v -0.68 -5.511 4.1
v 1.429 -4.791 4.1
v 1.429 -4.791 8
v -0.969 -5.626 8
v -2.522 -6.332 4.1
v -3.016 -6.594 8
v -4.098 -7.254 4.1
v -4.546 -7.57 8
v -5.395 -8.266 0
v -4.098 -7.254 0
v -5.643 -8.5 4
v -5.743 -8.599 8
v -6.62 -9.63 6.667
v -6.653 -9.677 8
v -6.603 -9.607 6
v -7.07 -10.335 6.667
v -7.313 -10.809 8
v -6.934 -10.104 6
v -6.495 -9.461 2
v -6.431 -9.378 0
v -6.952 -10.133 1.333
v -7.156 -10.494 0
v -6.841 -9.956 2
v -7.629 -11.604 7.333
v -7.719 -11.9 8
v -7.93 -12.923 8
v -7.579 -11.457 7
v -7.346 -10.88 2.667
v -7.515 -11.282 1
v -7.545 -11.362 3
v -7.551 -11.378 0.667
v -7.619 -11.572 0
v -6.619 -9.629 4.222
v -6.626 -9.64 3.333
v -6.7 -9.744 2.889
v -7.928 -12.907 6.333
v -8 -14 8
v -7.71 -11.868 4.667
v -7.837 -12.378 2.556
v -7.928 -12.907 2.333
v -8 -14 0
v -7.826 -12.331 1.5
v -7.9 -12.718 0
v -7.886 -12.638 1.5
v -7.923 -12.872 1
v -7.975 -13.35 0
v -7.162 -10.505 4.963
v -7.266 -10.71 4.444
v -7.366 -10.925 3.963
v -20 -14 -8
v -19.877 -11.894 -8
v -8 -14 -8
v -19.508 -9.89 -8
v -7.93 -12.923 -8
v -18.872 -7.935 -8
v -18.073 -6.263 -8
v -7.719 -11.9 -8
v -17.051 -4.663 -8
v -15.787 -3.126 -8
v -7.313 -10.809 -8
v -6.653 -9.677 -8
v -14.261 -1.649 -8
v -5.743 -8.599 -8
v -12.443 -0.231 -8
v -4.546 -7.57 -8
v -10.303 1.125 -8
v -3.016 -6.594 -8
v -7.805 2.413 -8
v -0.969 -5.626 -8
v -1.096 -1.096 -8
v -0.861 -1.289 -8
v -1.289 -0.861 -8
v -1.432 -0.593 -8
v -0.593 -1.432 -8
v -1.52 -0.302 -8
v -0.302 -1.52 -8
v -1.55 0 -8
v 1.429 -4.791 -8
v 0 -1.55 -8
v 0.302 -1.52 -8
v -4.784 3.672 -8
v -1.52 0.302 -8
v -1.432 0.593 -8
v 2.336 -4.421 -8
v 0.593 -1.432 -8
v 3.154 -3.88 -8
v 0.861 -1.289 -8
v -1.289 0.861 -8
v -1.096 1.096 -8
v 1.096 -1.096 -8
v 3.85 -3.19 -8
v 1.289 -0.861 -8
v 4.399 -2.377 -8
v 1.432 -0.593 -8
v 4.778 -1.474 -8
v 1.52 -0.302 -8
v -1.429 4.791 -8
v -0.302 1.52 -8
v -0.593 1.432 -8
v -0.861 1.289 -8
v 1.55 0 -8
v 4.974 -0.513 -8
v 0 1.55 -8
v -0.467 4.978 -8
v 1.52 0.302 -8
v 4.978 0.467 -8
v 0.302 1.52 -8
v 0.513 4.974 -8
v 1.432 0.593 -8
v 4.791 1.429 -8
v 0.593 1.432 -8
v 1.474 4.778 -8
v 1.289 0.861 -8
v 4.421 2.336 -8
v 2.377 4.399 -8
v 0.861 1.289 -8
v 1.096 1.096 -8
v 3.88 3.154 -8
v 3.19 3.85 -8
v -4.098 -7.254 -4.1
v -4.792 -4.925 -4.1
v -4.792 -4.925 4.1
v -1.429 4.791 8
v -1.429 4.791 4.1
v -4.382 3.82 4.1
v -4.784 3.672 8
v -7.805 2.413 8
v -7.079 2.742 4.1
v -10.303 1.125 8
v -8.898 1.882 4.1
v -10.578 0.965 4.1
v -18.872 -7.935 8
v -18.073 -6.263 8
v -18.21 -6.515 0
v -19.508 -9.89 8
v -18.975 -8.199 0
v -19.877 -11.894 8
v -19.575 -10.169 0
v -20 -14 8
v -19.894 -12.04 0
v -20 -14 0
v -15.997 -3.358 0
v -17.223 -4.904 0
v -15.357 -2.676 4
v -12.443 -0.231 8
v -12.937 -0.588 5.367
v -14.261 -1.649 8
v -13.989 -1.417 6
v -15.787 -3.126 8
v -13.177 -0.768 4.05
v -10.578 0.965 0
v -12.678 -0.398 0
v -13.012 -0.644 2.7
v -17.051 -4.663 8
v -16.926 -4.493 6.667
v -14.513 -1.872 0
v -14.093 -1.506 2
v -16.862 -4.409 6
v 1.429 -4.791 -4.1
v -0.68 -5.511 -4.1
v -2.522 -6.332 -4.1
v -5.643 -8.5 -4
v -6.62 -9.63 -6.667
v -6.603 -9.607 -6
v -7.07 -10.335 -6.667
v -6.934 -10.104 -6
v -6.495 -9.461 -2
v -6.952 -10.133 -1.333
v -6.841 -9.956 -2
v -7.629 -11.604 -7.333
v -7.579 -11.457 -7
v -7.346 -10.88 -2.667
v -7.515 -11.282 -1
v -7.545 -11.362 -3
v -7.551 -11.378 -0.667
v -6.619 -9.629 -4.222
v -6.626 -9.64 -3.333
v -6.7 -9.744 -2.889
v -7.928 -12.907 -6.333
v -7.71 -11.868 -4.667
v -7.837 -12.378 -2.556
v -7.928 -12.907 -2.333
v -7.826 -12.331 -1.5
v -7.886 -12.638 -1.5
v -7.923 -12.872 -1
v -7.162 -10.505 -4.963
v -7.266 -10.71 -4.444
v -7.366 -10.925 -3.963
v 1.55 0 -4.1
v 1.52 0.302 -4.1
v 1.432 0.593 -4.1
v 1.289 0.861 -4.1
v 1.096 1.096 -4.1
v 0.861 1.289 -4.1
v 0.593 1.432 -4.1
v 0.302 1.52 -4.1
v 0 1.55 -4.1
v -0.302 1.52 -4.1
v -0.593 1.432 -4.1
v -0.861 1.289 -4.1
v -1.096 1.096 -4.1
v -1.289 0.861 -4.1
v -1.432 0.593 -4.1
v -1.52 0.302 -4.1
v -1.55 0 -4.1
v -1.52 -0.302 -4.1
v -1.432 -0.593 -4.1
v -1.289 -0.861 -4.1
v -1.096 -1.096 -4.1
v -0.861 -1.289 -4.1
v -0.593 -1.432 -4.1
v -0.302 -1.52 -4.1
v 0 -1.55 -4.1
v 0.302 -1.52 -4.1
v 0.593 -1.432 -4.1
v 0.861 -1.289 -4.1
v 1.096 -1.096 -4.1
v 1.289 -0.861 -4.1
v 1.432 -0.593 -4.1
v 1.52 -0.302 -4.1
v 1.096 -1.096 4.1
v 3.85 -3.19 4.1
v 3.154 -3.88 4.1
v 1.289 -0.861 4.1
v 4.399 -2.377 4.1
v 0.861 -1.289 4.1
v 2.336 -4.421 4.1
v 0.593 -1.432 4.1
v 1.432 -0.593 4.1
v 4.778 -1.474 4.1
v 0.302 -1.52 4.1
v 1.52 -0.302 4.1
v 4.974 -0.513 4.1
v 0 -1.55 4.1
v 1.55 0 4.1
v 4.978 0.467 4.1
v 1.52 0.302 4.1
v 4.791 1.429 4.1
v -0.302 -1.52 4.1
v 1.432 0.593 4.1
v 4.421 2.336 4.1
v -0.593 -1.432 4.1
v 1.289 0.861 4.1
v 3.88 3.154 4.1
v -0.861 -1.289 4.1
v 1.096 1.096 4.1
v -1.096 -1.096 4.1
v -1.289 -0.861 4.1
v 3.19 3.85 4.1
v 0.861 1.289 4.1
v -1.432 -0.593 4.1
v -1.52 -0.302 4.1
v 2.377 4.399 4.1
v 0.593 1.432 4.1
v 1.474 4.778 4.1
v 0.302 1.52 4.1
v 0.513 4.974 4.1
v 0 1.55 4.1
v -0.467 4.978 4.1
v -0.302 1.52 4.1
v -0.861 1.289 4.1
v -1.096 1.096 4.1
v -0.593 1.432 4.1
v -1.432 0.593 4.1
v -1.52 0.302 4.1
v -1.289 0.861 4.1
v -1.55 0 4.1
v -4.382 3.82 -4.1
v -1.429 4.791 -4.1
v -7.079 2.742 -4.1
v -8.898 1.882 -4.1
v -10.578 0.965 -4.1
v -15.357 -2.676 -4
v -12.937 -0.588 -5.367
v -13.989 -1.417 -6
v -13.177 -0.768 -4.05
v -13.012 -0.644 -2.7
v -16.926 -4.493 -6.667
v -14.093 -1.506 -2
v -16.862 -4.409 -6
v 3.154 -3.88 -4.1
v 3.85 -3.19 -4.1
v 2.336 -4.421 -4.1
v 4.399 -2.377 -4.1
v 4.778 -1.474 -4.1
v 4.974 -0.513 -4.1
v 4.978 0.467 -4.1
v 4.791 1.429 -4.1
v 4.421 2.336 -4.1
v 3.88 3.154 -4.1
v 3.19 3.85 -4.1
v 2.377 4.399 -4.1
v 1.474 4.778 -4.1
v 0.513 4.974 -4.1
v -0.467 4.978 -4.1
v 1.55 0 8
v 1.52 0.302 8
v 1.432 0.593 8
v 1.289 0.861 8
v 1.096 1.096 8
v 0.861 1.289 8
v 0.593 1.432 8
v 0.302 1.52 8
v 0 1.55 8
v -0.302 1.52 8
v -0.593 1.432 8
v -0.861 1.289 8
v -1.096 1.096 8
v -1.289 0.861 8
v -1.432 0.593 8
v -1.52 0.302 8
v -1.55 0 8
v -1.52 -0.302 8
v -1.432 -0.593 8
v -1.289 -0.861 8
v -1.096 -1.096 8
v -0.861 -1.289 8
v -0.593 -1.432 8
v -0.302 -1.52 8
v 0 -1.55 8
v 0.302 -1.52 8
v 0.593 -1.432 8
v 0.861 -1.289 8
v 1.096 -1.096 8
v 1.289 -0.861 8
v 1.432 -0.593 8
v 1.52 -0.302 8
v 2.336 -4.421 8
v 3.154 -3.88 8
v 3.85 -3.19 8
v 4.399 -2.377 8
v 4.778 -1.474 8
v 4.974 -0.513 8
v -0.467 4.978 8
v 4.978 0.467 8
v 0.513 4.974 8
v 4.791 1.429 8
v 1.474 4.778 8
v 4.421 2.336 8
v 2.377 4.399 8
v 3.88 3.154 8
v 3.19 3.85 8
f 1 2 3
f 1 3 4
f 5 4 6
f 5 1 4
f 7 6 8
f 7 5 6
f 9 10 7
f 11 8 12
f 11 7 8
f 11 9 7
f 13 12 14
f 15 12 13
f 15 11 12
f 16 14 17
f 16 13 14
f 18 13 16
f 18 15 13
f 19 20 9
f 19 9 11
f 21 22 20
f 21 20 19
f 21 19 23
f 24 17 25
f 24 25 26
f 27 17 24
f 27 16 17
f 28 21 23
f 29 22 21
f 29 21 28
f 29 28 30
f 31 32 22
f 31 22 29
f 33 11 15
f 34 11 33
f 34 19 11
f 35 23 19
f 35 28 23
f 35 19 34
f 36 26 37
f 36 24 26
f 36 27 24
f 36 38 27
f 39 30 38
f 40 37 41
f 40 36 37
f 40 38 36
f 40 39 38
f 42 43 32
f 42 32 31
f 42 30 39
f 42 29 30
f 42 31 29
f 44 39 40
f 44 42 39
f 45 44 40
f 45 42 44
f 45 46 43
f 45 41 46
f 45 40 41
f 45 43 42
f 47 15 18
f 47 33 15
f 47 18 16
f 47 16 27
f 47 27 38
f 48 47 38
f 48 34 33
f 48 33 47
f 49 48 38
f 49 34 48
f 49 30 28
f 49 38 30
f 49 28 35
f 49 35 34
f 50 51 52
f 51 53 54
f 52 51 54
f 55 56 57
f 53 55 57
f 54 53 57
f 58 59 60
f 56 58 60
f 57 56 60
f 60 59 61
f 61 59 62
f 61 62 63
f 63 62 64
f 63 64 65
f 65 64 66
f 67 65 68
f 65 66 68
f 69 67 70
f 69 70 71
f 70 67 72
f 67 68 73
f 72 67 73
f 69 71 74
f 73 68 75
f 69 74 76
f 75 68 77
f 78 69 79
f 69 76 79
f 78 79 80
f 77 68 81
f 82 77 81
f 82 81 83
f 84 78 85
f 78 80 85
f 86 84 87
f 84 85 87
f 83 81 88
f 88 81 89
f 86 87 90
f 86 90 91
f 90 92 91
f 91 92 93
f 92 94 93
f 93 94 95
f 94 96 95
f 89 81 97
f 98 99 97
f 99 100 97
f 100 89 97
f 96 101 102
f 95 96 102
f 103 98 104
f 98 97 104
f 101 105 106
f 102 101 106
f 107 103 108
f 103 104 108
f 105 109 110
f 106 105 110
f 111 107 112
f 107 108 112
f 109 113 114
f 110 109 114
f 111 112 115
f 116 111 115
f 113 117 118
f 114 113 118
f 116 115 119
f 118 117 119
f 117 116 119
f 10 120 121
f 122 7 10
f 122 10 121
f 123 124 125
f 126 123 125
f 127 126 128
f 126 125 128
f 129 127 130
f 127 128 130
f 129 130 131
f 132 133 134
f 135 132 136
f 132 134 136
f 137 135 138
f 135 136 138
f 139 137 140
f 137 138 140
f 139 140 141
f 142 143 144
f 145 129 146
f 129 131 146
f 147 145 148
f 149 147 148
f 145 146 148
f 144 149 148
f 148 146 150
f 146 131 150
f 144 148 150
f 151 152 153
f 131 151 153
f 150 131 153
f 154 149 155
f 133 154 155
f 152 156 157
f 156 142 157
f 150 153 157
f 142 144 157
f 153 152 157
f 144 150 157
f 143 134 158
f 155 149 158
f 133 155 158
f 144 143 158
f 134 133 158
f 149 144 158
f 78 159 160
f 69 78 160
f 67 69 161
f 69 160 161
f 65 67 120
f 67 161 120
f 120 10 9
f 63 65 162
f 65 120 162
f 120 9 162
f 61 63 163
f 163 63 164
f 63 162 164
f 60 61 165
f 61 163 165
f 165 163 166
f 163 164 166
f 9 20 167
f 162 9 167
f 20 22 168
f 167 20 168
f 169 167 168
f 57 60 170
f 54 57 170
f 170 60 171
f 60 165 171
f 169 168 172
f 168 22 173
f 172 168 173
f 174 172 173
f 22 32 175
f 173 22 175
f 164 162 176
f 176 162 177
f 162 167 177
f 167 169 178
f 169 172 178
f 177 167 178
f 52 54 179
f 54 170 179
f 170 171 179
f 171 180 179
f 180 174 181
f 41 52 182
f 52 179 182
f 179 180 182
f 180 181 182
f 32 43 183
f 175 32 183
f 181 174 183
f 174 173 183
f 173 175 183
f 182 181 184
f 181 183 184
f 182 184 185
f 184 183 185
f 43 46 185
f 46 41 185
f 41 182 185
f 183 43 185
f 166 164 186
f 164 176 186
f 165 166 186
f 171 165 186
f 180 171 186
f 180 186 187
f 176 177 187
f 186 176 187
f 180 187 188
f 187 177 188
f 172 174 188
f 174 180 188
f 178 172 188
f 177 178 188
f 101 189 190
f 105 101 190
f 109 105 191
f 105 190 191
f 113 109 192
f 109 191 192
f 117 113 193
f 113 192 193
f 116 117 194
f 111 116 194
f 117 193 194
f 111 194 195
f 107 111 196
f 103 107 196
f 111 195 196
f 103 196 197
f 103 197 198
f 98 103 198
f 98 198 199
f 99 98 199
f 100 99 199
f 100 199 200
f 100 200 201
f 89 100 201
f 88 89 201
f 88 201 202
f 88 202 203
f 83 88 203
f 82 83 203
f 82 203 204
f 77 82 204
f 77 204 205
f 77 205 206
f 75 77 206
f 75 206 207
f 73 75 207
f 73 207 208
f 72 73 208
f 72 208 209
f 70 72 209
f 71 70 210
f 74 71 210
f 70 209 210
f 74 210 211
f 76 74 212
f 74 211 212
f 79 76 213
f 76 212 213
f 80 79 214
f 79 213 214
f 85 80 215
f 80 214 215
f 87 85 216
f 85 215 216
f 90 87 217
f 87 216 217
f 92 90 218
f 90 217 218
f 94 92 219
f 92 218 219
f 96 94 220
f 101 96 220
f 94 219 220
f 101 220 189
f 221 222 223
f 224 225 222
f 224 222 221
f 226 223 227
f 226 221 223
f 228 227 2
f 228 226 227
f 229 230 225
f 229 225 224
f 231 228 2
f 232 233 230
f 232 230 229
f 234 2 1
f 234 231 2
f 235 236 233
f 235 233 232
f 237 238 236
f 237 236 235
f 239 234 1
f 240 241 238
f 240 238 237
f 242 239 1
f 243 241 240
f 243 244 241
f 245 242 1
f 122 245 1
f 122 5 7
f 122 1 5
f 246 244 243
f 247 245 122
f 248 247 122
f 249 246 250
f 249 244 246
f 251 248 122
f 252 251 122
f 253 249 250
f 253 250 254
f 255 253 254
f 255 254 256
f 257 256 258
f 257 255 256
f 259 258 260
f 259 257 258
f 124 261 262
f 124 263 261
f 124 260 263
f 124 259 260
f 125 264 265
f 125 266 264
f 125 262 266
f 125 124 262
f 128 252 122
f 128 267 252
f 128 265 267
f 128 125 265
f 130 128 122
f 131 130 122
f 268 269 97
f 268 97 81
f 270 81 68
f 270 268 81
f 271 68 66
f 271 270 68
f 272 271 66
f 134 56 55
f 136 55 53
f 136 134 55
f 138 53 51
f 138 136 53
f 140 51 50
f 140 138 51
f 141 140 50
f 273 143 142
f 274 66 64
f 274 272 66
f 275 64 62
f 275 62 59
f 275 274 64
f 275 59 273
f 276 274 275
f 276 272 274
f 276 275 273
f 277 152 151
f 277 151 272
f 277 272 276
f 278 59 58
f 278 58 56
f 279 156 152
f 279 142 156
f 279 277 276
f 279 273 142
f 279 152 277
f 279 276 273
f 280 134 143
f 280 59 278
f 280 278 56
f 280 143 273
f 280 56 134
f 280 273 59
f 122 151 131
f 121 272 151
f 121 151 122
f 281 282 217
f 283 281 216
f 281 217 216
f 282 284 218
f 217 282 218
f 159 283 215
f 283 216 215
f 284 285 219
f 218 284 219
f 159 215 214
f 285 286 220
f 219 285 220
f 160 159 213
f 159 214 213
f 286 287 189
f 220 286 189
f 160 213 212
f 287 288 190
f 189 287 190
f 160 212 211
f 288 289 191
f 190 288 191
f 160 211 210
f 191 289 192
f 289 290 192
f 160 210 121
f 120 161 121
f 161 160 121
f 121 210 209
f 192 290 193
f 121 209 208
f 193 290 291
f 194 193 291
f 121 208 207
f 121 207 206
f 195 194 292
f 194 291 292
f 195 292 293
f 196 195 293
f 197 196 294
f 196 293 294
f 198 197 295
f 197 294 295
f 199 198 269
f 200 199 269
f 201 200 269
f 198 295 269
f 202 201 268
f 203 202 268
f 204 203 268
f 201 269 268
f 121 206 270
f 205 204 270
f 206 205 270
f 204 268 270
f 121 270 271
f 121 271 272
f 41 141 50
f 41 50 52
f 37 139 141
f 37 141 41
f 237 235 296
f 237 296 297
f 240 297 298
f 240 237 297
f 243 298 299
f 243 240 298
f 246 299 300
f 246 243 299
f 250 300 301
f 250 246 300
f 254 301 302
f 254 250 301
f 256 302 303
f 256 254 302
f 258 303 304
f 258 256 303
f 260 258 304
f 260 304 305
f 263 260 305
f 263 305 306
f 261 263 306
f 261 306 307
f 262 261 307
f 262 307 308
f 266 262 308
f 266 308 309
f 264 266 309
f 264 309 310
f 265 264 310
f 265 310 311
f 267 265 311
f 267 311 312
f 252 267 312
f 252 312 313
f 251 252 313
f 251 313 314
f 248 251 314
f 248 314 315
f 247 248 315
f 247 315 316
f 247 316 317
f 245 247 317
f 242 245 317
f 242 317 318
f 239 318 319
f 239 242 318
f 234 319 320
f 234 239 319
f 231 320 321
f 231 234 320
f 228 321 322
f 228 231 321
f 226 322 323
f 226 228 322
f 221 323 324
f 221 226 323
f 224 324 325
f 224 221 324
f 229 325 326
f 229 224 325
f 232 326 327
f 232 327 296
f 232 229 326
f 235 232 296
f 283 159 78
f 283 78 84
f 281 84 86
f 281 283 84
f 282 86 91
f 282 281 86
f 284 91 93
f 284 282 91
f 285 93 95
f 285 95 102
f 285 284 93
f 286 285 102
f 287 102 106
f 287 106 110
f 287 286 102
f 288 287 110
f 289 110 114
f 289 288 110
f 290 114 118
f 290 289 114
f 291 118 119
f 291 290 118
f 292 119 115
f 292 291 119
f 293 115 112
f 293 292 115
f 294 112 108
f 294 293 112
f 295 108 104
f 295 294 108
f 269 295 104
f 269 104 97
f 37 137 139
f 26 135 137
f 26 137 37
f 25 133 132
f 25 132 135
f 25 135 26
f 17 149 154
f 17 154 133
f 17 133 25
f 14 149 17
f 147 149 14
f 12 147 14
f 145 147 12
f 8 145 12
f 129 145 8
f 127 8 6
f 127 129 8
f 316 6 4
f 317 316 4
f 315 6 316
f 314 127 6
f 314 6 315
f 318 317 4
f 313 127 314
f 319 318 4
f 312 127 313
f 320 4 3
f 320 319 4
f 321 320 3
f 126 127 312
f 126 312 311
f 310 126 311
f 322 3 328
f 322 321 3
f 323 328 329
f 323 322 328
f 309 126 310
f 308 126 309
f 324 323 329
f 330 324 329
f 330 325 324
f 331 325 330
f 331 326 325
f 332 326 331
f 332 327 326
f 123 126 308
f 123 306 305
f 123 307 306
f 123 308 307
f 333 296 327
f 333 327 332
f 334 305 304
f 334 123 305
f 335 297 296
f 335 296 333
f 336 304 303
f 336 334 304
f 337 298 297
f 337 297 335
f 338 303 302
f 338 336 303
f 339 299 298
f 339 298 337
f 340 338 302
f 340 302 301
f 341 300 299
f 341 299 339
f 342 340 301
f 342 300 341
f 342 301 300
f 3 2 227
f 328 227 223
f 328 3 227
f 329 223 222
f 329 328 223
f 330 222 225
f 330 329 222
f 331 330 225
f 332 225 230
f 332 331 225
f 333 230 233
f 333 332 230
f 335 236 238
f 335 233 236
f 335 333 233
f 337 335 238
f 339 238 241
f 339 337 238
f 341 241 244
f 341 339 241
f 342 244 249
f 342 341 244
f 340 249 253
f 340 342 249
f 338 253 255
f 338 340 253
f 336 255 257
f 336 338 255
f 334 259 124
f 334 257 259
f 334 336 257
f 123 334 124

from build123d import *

# Parameters (mm, degrees)
SKETCH1_R           = 1.55
BOSS_EXTRUDE1_DEPTH = 8
CUT_EXTRUDE1_DEPTH  = 4.1
CHAMFER1_START      = -4.1
CHAMFER1_DEPTH      = 8.2


with BuildPart() as part:
    # Sketch1 → Boss-Extrude1 (new, symmetric)
    with BuildSketch(Plane.XY):
        with BuildLine():
            Line((-20, -14), (-8, -14))
            add(Edge.make_bspline(
                [(1.429165494, -4.791397081), (-8, -7.603904107), (-8, -14)],
                knots=[0, 0, 0, 1, 1, 1], degree=2))
            ThreePointArc((1.429165494, -4.791397081), (4.791397081, 1.429165494), (-1.429165494, 4.791397081))
            add(Edge.make_bspline(
                [(-1.429165494, 4.791397081), (-20, -0.747863266), (-20, -14)],
                knots=[0, 0, 0, 1, 1, 1], degree=2))
        make_face()
        Circle(SKETCH1_R, mode=Mode.SUBTRACT)
    extrude(amount=BOSS_EXTRUDE1_DEPTH, both=True)

    # Sketch2 → Cut-Extrude1 (cut, symmetric)
    with BuildSketch(Plane.XY):
        with BuildLine():
            Line((-4.097628997, -7.253626281), (-7.078971892, 2.741575612))
            add(Edge.make_bspline(
                [(-1.429165494, 4.791397081), (-4.509542465, 3.872590228), (-7.078971892, 2.741575612)],
                knots=[0, 0, 0, 1, 1, 1], degree=2))
            ThreePointArc((-1.429165494, 4.791397081), (4.791397081, 1.429165494), (1.429165494, -4.791397081))
            add(Edge.make_bspline(
                [(-4.097628997, -7.253626281), (-1.934020936, -5.794559606), (1.429165494, -4.791397081)],
                knots=[0, 0, 0, 1, 1, 1], degree=2))
        make_face()
    extrude(amount=CUT_EXTRUDE1_DEPTH, both=True, mode=Mode.SUBTRACT)

    # Chamfer1: read off the stored shape, not the designer's step
    # Chamfer1 outline → Chamfer1 (cut)
    with BuildSketch(Plane.XY.offset(CHAMFER1_START)):
        with BuildLine():
            Line((-10.578223544, 0.965390038), (-4.792307112, -4.924659687))
            Line((-4.792307112, -4.924659687), (-7.078971892, 2.741575612))
            add(Edge.make_bspline(
                [(-7.078971892, 2.741575612), (-8.966458483, 1.910739435), (-10.578223544, 0.965390038)],
                knots=[0.165871758, 0.165871758, 0.165871758, 0.287720102, 0.287720102, 0.287720102], degree=2))
        make_face()
    extrude(amount=CHAMFER1_DEPTH, mode=Mode.SUBTRACT)


solid = part.part
